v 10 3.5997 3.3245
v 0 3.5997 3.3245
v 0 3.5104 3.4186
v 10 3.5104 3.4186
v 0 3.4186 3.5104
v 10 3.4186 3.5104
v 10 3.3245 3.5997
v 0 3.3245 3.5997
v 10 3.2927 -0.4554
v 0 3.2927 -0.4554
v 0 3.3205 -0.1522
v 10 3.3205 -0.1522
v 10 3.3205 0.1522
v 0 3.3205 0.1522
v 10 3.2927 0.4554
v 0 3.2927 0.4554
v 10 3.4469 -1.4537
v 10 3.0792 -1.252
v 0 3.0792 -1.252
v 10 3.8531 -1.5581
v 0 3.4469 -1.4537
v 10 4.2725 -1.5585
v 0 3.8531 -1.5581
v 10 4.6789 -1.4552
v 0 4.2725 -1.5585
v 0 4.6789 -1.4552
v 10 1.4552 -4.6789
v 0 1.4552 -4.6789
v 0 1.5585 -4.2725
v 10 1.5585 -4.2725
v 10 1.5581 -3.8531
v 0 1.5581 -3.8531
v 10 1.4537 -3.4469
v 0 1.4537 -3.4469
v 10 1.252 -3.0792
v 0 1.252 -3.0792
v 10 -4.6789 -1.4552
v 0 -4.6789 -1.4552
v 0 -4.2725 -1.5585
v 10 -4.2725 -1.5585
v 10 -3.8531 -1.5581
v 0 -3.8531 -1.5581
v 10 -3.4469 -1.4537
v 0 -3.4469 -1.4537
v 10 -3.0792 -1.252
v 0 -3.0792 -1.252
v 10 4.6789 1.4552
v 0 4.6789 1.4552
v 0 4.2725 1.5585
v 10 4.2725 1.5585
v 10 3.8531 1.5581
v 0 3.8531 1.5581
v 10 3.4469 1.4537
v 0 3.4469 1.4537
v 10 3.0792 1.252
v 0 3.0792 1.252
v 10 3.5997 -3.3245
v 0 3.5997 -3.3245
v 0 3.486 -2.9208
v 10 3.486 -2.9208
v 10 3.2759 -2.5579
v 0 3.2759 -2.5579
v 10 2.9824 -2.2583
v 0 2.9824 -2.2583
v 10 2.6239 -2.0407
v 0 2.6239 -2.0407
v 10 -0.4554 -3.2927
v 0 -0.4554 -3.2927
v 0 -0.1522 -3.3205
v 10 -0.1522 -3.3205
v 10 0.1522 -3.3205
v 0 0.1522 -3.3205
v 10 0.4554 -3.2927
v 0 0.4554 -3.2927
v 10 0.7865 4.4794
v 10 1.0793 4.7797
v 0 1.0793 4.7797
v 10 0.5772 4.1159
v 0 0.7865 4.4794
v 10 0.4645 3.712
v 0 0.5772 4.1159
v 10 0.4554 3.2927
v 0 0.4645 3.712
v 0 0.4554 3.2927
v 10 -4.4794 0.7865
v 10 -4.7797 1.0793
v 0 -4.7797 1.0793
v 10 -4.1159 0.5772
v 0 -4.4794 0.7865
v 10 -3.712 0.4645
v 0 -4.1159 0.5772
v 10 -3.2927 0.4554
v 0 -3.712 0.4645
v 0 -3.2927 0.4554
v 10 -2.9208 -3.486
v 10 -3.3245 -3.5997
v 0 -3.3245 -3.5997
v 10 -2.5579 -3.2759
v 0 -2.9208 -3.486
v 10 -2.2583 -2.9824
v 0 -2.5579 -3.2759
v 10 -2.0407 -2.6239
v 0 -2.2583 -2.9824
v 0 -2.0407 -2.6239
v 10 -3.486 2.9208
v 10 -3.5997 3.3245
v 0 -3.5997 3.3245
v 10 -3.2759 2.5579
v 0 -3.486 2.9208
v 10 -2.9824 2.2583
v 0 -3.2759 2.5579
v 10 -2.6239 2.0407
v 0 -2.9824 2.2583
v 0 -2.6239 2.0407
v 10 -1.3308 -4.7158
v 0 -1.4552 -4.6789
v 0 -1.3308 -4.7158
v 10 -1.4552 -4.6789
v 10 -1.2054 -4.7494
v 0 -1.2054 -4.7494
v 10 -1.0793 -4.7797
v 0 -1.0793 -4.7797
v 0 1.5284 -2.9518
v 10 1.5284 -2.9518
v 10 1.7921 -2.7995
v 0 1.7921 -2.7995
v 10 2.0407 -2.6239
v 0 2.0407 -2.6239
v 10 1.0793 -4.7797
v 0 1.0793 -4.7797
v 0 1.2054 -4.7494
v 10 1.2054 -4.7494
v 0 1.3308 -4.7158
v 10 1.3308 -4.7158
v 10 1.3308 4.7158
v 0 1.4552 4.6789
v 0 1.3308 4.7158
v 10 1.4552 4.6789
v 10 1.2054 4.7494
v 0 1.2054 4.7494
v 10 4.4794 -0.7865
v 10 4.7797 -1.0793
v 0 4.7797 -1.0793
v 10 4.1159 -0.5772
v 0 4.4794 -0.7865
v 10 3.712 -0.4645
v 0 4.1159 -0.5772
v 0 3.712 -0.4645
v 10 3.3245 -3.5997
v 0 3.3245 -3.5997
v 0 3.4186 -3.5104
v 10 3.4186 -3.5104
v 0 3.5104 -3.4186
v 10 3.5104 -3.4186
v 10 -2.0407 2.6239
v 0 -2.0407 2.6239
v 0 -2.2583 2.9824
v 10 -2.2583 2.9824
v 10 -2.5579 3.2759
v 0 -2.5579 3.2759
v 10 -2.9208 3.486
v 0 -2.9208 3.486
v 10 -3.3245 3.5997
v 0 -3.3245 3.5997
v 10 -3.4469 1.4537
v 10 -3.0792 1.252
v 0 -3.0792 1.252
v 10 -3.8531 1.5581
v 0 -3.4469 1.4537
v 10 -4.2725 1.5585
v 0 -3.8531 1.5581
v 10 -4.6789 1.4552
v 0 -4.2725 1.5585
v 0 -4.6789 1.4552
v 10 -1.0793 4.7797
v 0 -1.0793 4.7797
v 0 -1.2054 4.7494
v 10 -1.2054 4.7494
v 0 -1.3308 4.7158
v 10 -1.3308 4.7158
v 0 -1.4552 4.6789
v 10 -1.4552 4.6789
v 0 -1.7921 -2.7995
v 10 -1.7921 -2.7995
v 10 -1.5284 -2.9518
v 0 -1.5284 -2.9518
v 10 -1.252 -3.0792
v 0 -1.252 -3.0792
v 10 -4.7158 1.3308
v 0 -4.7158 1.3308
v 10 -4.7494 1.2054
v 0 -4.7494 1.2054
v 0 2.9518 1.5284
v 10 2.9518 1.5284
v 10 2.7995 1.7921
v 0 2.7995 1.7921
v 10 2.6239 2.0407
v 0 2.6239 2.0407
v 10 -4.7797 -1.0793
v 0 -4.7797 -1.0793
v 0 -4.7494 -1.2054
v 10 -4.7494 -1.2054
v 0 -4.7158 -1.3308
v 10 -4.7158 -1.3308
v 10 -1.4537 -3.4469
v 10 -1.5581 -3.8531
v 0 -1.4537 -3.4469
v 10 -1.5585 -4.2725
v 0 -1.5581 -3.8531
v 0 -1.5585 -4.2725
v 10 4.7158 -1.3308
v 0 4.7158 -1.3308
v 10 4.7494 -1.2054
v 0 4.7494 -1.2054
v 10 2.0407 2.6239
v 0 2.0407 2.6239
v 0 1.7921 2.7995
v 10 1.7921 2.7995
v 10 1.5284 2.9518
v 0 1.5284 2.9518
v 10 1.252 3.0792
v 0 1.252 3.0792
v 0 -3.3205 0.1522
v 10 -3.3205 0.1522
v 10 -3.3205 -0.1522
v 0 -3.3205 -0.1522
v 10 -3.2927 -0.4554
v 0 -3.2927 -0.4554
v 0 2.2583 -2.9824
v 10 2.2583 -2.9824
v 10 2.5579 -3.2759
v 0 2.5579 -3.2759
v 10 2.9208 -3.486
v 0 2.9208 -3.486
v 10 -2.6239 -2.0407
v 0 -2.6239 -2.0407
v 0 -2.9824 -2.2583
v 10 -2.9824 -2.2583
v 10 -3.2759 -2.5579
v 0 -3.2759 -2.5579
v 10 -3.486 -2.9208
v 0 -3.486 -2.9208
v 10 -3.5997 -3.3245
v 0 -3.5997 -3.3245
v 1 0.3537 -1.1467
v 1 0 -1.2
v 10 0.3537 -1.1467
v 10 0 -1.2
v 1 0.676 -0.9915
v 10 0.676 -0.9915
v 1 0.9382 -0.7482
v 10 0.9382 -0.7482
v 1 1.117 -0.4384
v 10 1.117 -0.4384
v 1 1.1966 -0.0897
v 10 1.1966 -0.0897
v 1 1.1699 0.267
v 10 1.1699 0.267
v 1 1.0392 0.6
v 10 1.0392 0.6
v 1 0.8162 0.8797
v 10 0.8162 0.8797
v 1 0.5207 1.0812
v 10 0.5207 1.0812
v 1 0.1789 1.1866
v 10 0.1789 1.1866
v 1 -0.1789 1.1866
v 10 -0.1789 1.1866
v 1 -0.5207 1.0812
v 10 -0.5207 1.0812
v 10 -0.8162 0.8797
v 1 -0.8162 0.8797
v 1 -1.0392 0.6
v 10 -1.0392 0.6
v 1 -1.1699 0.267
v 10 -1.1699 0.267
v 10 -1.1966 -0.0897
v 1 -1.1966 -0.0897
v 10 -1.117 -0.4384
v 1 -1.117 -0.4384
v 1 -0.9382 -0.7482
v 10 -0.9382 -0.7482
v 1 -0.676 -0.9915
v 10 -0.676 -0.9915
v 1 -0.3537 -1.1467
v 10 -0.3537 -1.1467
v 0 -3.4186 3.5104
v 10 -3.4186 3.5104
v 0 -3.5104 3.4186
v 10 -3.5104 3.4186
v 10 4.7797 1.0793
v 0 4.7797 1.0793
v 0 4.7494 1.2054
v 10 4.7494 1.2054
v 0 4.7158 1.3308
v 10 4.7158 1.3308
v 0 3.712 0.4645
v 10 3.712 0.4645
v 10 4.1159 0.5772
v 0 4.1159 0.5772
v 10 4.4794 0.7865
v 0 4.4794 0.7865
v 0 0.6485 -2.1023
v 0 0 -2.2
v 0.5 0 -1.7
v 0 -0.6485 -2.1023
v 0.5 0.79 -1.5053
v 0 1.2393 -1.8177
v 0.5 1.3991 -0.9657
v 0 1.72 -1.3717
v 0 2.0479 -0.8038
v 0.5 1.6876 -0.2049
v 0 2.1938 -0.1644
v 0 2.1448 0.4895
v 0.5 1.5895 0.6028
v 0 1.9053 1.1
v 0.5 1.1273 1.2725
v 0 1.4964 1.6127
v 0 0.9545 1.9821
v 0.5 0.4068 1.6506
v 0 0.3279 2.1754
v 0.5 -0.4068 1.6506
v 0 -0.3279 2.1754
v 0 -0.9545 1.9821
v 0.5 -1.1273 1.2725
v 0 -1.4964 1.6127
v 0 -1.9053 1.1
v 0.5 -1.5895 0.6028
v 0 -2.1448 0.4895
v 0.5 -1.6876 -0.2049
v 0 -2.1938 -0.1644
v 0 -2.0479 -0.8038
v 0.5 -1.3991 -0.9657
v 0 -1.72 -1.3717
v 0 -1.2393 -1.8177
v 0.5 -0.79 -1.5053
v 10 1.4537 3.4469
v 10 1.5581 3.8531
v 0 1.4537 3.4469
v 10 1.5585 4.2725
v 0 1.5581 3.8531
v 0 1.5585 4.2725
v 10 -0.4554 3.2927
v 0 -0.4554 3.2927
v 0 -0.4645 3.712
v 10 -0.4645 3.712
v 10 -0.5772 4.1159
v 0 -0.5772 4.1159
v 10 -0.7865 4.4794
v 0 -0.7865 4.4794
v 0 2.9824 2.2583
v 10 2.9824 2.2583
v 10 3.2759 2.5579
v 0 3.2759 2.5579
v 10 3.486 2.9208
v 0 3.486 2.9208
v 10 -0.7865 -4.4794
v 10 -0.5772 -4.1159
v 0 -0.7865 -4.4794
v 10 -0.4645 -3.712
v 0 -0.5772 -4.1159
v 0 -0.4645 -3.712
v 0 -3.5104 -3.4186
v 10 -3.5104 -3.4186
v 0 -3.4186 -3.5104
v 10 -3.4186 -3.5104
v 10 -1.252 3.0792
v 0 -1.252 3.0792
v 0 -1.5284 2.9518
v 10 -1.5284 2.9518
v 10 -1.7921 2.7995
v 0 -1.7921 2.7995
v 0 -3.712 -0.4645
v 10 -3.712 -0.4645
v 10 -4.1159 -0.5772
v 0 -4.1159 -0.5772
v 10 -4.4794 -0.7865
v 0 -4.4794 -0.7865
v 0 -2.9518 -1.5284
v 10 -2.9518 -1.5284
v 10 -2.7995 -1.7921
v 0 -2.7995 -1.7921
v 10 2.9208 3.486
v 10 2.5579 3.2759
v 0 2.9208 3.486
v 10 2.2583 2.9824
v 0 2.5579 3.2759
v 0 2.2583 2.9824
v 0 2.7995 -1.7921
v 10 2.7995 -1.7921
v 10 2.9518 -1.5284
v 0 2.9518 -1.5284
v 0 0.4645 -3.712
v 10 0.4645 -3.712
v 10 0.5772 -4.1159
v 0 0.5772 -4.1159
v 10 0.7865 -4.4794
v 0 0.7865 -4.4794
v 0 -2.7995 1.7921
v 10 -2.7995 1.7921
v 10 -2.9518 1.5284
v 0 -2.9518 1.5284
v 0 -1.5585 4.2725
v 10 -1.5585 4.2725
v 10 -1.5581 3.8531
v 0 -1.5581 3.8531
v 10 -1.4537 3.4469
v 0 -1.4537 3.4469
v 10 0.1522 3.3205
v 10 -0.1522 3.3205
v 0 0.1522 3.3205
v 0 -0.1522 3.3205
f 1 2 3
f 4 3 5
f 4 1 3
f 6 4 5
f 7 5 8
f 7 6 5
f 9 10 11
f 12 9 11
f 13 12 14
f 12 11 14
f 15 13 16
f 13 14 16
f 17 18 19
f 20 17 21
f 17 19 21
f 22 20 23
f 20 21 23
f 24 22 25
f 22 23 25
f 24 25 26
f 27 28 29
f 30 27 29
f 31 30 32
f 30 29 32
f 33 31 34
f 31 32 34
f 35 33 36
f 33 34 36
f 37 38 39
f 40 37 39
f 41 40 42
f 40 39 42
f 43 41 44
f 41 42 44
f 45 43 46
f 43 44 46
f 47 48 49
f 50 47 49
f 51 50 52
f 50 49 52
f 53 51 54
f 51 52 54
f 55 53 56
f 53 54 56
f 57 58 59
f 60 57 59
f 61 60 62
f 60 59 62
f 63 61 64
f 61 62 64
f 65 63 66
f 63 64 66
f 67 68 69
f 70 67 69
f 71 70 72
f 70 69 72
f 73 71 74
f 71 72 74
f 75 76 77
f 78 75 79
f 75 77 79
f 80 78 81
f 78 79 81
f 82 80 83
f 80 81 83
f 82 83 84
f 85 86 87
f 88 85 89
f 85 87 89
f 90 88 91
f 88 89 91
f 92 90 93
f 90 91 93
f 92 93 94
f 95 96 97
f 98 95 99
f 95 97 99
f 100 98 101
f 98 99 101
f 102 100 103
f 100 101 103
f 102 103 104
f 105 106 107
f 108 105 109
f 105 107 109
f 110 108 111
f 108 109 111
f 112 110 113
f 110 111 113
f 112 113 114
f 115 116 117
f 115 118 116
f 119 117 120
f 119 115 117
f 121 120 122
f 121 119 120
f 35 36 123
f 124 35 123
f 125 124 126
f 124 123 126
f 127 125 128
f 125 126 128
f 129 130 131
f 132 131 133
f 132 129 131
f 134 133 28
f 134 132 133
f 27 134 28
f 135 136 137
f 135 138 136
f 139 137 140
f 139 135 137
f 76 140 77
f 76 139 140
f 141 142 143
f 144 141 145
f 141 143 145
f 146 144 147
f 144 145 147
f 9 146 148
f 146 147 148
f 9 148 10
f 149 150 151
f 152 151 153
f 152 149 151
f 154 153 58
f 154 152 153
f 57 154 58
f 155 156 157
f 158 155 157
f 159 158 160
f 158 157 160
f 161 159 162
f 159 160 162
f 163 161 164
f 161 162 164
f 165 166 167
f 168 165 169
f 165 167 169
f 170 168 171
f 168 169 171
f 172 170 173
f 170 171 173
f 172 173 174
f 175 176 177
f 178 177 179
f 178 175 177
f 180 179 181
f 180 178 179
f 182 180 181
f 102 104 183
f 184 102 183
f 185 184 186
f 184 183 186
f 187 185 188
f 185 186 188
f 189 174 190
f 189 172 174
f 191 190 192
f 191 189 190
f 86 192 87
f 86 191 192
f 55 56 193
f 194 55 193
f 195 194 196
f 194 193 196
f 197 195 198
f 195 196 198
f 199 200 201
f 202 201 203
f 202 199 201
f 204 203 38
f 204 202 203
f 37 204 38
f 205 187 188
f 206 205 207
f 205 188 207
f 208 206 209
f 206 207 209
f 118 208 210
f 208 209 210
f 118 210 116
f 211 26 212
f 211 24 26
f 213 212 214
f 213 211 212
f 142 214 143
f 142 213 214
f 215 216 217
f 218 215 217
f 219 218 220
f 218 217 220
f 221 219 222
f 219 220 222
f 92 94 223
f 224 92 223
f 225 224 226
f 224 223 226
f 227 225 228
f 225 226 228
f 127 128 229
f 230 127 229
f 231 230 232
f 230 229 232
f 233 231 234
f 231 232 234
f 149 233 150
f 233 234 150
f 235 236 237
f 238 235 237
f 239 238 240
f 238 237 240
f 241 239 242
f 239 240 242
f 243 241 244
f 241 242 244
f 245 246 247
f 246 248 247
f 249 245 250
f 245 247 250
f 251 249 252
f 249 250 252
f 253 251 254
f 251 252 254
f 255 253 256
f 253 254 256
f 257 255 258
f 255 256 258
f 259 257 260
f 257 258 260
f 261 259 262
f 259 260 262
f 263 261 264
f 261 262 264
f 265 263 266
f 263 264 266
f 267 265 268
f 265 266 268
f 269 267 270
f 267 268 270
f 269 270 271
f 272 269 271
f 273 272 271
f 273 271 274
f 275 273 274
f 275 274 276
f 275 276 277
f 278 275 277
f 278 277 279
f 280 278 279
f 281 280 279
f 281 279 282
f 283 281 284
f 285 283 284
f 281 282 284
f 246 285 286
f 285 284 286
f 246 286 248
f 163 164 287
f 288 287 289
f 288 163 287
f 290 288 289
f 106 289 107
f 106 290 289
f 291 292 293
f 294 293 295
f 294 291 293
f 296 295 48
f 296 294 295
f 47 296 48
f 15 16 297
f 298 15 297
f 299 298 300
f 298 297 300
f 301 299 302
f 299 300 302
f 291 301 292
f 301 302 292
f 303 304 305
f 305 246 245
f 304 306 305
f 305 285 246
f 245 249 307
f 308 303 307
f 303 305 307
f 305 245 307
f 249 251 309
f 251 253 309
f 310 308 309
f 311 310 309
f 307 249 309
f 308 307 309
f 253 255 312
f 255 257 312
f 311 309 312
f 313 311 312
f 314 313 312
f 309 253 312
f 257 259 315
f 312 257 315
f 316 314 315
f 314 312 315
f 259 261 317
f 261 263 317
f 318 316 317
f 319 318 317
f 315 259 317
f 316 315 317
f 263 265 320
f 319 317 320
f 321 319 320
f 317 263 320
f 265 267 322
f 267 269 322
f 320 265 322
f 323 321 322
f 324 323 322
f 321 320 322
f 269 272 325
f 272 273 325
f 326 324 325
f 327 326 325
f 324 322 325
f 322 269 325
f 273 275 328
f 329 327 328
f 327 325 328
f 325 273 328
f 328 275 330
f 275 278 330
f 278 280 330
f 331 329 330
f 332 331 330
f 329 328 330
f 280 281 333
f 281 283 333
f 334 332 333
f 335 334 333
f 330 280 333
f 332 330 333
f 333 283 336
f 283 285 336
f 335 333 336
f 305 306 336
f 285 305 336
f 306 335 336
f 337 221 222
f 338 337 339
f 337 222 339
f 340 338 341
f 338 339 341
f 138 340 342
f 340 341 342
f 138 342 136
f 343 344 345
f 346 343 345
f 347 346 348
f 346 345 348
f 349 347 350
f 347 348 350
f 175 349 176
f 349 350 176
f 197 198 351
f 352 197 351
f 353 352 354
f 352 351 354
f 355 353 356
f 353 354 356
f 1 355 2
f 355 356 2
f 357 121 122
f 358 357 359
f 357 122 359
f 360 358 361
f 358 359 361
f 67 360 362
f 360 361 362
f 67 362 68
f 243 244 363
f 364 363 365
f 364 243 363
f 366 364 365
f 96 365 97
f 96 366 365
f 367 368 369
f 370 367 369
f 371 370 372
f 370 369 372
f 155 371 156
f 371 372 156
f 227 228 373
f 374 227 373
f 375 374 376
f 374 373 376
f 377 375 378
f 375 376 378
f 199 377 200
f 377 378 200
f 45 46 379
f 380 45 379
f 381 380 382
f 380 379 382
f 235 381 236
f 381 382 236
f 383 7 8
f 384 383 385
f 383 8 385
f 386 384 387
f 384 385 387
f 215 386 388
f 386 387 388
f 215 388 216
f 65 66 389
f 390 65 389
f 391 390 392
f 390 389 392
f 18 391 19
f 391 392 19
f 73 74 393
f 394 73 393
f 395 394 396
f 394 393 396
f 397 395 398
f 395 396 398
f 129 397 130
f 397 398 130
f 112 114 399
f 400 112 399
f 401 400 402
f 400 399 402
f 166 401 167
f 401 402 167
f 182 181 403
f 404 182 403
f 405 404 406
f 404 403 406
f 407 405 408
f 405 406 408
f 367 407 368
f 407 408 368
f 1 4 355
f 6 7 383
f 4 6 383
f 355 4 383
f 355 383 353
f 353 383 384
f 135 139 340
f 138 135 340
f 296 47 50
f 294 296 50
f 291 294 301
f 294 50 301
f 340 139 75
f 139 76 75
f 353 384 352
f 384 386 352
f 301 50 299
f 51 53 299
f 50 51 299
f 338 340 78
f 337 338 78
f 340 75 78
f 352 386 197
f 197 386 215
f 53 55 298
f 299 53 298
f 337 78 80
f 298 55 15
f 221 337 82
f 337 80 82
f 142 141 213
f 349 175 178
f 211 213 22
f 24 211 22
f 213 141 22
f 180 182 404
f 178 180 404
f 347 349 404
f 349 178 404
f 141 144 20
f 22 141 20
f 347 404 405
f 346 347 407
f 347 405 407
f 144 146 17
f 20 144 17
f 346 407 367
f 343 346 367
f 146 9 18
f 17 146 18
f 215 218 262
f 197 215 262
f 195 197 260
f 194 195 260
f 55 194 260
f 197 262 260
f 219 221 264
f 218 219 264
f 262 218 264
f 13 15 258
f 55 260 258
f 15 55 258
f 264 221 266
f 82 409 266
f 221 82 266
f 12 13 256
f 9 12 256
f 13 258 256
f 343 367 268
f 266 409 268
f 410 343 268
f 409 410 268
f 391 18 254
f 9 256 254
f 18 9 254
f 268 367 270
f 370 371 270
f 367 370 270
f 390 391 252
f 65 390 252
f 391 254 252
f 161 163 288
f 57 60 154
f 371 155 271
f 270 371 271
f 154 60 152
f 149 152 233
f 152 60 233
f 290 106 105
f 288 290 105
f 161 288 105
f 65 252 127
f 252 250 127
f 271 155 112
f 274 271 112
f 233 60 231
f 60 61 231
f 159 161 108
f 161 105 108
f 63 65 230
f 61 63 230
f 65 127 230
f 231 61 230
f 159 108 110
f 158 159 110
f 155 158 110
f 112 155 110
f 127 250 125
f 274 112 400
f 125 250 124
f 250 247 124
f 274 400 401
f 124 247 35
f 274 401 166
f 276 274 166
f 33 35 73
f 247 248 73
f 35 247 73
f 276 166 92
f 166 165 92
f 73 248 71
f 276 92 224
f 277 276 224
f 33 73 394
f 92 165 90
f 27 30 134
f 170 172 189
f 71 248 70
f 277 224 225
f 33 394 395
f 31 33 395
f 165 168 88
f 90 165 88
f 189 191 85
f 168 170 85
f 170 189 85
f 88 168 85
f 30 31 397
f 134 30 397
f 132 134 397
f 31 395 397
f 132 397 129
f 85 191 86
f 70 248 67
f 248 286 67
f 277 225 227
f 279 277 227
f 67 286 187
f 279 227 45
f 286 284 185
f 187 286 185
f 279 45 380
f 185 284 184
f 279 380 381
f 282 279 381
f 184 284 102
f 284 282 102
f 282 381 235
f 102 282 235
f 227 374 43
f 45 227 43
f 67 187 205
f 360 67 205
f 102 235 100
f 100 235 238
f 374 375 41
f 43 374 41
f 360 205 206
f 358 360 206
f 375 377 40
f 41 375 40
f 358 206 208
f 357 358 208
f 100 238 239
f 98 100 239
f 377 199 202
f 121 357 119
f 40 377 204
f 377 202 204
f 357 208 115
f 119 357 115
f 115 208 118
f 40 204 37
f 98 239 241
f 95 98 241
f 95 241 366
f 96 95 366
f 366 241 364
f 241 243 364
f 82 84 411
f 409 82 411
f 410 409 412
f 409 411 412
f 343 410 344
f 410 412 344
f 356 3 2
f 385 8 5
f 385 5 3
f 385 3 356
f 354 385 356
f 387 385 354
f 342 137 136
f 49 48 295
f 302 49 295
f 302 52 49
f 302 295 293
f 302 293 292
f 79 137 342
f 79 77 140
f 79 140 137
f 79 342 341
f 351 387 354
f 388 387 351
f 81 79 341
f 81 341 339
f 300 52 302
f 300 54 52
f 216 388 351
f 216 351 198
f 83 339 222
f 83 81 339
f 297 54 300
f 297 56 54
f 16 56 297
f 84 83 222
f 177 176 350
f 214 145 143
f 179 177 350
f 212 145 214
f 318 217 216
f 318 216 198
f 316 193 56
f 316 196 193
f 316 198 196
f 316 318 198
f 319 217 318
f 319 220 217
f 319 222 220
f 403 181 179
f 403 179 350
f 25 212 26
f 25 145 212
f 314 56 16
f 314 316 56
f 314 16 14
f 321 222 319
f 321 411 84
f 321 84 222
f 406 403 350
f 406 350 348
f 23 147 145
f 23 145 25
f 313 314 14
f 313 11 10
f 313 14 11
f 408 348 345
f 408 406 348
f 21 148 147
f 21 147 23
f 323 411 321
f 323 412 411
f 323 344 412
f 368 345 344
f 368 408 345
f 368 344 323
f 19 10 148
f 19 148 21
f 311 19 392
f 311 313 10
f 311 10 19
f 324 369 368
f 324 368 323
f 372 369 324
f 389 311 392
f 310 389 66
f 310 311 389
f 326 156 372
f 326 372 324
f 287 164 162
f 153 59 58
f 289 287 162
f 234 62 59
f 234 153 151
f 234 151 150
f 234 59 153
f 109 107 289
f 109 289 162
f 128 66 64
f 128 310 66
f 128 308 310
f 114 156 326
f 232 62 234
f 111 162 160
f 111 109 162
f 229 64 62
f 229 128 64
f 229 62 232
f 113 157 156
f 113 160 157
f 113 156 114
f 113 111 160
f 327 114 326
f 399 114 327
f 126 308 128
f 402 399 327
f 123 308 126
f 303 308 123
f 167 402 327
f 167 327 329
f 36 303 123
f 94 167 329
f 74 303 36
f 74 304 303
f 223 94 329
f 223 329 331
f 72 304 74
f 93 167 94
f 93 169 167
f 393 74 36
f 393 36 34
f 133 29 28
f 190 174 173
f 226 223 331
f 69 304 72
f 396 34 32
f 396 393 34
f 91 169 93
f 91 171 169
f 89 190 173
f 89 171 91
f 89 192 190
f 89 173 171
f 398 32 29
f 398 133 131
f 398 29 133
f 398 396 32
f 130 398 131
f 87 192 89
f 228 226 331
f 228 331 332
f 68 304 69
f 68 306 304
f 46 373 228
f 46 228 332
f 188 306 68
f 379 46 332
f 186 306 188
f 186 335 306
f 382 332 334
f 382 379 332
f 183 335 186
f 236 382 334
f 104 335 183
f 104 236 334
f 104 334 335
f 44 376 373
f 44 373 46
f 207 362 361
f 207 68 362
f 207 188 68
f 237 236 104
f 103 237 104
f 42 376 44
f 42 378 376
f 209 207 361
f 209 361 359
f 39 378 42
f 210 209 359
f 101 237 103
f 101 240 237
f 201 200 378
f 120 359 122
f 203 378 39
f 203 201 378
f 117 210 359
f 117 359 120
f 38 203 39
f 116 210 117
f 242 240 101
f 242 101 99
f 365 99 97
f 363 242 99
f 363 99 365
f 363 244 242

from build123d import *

# Parameters (mm, degrees)
BASPROSKE_W                                     = 10
BASPROSKE_H                                     = 4.9
TOOTHCUT_DEPTH                                  = 13.166347028
TEETHCUTS_COUNT                                 = 12
TEETHCUTS_ANGLE                                 = 330
BORSKE_R                                        = 0.5
BORE_DEPTH                                      = 50.0000508
SKETCH2_R                                       = 1
CUT_EXTRUDE1_DEPTH                              = 13.070224944
CSK_FOR_M2_FLAT_HEAD_MACHINE_SCREW1_D           = 2.4
CSK_FOR_M2_FLAT_HEAD_MACHINE_SCREW1_CSINK_D     = 4.4
CSK_FOR_M2_FLAT_HEAD_MACHINE_SCREW1_CSINK_ANGLE = 90


with BuildPart() as part:
    # BasProSke → Base-Revolve (revolve)
    with BuildSketch(Plane(origin=(0, 0, 0), x_dir=(1, 0, 0), z_dir=(0, 1, 0)), mode=Mode.PRIVATE) as base_revolve_sk:
        with Locations((5, 2.45)):
            Rectangle(BASPROSKE_W, BASPROSKE_H)
    revolve(base_revolve_sk.sketch.rotate(Axis((-10, 0, 0), (1, 0, 0)), 180), axis=Axis((-10, 0, 0), (1, 0, 0)))

    # TooCutSke → ToothCut (cut, through all)
    with BuildSketch(Plane(origin=(0, 0, 0), x_dir=(0, 0, -1), z_dir=(1, 0, 0))):
        with BuildLine():
            ThreePointArc((0.45535744, 3.292662388), (0, 3.324), (-0.45535744, 3.292662388))
            ThreePointArc((-0.45535744, 3.292662388), (-0.583649315, 4.130986789), (-1.105088241, 4.799827615))
            ThreePointArc((-1.105088241, 4.799827615), (0, 4.9254), (1.105088241, 4.799827615))
            ThreePointArc((1.105088241, 4.799827615), (0.583649315, 4.130986789), (0.45535744, 3.292662388))
        make_face()
    toothcut = extrude(amount=TOOTHCUT_DEPTH, mode=Mode.SUBTRACT)

    # TeethCuts: ToothCut ×12 about axis
    teethcuts_axis = Axis((-10, 0, 0), (1, 0, 0))
    for i in range(1, TEETHCUTS_COUNT):
        add(toothcut.rotate(teethcuts_axis, i * TEETHCUTS_ANGLE / (TEETHCUTS_COUNT - 1)), mode=Mode.SUBTRACT)

    # BorSke → Bore (cut, symmetric)
    with BuildSketch(Plane(origin=(0, 0, 0), x_dir=(0, 0, -1), z_dir=(1, 0, 0))):
        with Locations(Location((0, 0, 0), (0, 0, 180))):
            Circle(BORSKE_R)
    extrude(amount=BORE_DEPTH, both=True, mode=Mode.SUBTRACT)

    # Sketch2 → Cut-Extrude1 (cut, through all)
    with BuildSketch(Plane.ZY):
        Circle(SKETCH2_R)
    extrude(amount=-CUT_EXTRUDE1_DEPTH, mode=Mode.SUBTRACT)

    # CSK for M2 Flat Head Machine Screw1 (through all)
    with Locations(Plane.ZY):
        with Locations((0, 0)):
            CounterSinkHole(CSK_FOR_M2_FLAT_HEAD_MACHINE_SCREW1_D / 2, CSK_FOR_M2_FLAT_HEAD_MACHINE_SCREW1_CSINK_D / 2, counter_sink_angle=CSK_FOR_M2_FLAT_HEAD_MACHINE_SCREW1_CSINK_ANGLE)


solid = part.part
